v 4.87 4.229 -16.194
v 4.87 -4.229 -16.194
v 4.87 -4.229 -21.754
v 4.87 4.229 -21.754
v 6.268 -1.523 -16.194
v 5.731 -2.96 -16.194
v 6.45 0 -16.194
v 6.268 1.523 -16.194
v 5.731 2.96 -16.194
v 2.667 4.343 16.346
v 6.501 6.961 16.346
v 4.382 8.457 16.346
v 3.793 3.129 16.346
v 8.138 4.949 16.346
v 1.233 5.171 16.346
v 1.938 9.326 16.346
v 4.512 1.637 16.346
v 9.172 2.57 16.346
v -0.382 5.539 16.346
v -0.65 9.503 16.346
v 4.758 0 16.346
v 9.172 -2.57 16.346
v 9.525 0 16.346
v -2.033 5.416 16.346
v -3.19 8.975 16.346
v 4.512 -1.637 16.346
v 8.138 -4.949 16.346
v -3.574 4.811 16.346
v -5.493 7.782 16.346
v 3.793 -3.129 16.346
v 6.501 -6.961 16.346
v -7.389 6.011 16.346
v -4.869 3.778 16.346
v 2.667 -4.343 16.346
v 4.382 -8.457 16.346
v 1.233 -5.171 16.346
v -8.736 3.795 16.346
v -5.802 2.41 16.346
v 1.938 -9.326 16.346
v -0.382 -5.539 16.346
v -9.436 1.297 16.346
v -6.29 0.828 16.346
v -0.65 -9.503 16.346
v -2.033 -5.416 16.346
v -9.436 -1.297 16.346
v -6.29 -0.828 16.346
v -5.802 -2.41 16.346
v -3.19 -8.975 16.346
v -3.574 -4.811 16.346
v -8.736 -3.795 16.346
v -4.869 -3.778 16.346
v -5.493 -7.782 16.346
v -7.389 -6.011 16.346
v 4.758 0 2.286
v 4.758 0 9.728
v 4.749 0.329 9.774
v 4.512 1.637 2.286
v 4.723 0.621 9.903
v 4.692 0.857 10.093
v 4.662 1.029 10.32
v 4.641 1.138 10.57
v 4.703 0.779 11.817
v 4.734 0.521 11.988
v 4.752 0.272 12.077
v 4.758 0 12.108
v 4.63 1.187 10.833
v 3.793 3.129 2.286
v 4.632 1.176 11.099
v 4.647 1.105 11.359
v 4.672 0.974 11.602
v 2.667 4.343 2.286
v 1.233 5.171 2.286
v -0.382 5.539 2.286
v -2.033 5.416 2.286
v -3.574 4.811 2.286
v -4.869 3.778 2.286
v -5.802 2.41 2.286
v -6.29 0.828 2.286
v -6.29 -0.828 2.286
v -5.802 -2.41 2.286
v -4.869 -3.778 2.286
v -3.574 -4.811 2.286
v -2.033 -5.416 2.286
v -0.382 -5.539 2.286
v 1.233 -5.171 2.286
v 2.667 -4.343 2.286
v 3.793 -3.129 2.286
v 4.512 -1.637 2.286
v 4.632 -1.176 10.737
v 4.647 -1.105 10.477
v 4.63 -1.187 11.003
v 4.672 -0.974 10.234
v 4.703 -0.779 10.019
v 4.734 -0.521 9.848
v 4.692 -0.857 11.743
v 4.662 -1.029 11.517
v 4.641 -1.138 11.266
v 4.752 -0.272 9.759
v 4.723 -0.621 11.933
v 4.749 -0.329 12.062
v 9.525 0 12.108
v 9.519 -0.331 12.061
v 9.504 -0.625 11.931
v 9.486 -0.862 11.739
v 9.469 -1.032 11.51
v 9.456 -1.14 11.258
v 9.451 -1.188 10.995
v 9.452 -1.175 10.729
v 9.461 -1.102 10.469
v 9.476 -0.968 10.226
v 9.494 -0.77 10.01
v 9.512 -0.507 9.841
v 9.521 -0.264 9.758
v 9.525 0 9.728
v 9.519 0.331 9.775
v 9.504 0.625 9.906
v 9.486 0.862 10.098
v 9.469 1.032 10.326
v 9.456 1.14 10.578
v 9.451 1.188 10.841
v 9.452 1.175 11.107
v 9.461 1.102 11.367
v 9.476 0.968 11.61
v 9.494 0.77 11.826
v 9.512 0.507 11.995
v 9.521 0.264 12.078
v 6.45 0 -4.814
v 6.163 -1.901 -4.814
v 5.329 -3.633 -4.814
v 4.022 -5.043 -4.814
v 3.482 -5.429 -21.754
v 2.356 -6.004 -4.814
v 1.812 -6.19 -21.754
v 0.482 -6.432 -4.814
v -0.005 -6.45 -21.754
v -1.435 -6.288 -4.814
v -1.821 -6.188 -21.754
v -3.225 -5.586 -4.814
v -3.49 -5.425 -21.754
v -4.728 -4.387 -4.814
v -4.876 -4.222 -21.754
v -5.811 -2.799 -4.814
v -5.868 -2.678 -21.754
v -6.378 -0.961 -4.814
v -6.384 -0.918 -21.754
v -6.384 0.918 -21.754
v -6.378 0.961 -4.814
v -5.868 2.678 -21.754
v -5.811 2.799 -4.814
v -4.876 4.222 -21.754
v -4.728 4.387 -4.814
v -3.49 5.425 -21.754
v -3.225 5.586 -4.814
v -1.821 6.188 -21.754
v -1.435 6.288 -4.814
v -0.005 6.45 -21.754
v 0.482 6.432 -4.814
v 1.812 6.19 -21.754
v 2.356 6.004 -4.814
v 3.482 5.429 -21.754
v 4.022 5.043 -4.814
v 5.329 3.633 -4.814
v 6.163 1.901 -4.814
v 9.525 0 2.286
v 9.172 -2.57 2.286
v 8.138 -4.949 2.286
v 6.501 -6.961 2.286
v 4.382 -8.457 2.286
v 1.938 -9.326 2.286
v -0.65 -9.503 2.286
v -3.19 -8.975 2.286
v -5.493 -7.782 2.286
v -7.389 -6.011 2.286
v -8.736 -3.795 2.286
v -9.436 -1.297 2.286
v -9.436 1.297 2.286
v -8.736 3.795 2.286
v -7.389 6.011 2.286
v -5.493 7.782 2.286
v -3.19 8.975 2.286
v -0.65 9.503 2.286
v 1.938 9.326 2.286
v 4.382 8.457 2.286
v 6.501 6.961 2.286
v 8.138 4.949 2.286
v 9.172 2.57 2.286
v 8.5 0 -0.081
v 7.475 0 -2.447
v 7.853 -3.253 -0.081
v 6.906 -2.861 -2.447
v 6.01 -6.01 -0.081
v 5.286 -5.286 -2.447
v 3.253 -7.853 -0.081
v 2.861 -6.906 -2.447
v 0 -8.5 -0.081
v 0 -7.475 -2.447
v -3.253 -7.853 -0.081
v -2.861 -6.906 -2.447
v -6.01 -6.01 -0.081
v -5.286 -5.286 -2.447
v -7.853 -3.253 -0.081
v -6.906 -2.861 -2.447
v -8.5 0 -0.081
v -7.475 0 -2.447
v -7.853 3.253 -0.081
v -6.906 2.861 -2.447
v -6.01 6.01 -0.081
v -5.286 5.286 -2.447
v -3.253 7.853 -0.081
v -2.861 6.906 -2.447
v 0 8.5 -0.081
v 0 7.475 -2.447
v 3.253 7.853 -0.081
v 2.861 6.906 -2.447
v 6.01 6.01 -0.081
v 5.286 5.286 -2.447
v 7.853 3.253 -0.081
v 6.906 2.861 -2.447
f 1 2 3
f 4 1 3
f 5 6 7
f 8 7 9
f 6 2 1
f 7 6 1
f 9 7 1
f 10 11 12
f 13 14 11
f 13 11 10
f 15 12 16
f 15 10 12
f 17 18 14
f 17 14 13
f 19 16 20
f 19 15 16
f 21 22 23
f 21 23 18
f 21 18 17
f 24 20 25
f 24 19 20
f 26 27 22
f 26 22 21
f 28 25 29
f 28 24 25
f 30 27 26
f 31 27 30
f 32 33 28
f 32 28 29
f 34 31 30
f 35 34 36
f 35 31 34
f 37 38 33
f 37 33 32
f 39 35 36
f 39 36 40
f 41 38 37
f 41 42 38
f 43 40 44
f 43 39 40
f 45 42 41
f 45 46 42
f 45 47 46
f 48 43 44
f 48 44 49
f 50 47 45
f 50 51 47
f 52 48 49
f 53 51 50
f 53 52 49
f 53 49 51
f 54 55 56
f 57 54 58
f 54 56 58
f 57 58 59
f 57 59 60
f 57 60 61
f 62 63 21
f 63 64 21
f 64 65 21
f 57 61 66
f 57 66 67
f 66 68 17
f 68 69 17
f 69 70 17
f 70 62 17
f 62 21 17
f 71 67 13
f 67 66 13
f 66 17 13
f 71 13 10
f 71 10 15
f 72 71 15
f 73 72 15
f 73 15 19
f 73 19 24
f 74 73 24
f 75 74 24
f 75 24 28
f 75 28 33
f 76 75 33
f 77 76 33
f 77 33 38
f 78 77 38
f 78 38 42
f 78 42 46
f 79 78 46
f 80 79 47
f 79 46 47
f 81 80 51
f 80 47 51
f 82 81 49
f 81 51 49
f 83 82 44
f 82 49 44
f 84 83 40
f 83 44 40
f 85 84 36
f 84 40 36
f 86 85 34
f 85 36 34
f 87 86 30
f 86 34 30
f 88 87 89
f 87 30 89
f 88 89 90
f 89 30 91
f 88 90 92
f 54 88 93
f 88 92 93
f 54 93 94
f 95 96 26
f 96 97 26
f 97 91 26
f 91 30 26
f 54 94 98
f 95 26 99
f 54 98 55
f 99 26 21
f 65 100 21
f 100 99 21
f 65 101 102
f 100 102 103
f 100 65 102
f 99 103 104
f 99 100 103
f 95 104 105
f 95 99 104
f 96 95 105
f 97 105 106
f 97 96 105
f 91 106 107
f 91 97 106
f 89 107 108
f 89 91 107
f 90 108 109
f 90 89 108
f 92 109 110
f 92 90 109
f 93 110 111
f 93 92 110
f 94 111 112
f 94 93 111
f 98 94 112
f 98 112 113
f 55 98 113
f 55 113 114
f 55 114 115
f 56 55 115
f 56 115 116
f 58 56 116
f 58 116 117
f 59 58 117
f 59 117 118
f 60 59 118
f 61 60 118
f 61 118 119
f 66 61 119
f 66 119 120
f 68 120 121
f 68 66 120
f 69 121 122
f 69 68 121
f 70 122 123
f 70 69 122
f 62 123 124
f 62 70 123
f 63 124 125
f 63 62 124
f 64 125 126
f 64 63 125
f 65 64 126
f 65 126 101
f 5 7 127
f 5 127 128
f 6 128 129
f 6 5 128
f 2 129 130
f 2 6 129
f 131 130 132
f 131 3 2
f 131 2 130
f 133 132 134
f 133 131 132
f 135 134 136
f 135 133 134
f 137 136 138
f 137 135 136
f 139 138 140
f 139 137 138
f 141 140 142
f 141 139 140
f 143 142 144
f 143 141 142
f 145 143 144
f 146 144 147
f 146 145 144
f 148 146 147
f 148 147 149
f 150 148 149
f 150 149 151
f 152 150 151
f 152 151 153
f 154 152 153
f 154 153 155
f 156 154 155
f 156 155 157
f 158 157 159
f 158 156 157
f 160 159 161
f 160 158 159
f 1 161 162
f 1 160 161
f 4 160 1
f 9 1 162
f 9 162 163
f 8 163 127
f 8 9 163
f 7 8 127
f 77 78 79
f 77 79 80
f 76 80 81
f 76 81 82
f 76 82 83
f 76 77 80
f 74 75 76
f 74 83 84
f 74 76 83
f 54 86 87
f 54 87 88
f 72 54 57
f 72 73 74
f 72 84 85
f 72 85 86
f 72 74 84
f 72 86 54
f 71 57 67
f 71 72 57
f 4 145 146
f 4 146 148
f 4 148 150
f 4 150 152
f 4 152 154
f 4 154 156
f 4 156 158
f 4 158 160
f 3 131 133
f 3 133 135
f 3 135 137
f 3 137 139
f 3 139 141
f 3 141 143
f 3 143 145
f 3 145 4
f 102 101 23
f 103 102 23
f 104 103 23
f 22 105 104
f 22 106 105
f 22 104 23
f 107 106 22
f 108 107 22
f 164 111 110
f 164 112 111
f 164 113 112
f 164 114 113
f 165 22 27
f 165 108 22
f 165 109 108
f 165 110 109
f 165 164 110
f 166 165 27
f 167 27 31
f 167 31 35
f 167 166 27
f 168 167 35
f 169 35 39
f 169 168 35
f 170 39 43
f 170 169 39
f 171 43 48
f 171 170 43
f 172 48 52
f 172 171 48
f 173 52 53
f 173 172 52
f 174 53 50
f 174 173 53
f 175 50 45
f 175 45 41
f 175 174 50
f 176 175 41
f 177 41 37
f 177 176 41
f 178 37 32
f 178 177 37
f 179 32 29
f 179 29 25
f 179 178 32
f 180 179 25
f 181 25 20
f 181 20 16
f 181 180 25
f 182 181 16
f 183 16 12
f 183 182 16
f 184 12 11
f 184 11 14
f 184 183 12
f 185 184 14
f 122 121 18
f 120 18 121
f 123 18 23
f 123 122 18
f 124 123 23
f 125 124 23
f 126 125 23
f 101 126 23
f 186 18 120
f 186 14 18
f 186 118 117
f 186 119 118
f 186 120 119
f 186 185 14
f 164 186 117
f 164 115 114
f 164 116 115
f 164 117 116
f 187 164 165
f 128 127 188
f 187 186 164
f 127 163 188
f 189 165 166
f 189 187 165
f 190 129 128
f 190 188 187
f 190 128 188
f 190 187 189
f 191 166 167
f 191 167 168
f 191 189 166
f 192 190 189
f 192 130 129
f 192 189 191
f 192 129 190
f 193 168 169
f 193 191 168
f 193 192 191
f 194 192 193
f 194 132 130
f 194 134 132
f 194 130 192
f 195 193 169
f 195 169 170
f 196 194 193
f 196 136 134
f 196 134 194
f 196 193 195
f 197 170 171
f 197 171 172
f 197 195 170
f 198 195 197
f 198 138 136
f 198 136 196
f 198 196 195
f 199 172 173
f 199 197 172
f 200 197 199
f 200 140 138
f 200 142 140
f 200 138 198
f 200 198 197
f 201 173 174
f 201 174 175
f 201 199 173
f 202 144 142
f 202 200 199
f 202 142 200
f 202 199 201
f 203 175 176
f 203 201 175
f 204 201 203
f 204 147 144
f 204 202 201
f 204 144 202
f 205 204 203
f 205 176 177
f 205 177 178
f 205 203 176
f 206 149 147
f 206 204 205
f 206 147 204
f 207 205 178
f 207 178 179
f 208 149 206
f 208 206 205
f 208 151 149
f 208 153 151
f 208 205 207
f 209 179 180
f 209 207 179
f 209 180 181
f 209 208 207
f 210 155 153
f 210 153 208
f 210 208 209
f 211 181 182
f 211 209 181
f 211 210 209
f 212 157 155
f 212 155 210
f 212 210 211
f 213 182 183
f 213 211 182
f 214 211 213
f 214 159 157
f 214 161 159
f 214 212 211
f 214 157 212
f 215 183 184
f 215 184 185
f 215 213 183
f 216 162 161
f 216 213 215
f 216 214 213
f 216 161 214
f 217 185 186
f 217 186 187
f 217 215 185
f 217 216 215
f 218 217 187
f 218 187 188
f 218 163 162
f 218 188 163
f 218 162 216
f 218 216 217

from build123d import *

# Parameters (mm, degrees)
IZIM2_W               = 1.58
IZIM2_H               = 5.56
KES_EKSTR_ZYON1_DEPTH = 5
IZIM6_R               = 5.555
KES_EKSTR_ZYON2_DEPTH = 14.06
IZIM9_R               = 1.19
KES_EKSTR_ZYON3_DEPTH = 14.06


with BuildPart() as part:
    # Çizim1 → Döndür2 (revolve)
    with BuildSketch(Plane(origin=(0, 0, 0), x_dir=(0, 0, -1), z_dir=(1, 0, 0)), mode=Mode.PRIVATE) as d_nd_r2_sk:
        Polygon((-16.346129032, 9.525), (-2.286129032, 9.525), (4.813870968, 6.45), (21.753870968, 6.45), (21.753870968, 0), (-16.346129032, 0), align=None)
    revolve(d_nd_r2_sk.sketch.rotate(Axis((0, 0, 16.346129032), (0, 0, -1)), 90), axis=Axis((0, 0, 16.346129032), (0, 0, -1)))

    # Çizim2 → Kes-Ekstrüzyon1 (cut, symmetric)
    with BuildSketch(Plane(origin=(0, 0, 0), x_dir=(1, 0, 0), z_dir=(0, 1, 0))):
        with Locations((5.66, 18.973870968)):
            Rectangle(IZIM2_W, IZIM2_H)
    extrude(amount=KES_EKSTR_ZYON1_DEPTH, both=True, mode=Mode.SUBTRACT)

    # Çizim6 → Kes-Ekstrüzyon2 (cut)
    with BuildSketch(Plane.XY.offset(16.346129032)):
        with Locations((-0.796682274, 0)):
            Circle(IZIM6_R)
    extrude(amount=-KES_EKSTR_ZYON2_DEPTH, mode=Mode.SUBTRACT)

    # Çizim9 → Kes-Ekstrüzyon3 (cut)
    with BuildSketch(Plane(origin=(0, 0, 0), x_dir=(0, 0, -1), z_dir=(1, 0, 0))):
        with Locations(Location((-10.918037958, 0, 0), (0, 0, 180))):
            Circle(IZIM9_R)
    extrude(amount=KES_EKSTR_ZYON3_DEPTH, mode=Mode.SUBTRACT)


solid = part.part
